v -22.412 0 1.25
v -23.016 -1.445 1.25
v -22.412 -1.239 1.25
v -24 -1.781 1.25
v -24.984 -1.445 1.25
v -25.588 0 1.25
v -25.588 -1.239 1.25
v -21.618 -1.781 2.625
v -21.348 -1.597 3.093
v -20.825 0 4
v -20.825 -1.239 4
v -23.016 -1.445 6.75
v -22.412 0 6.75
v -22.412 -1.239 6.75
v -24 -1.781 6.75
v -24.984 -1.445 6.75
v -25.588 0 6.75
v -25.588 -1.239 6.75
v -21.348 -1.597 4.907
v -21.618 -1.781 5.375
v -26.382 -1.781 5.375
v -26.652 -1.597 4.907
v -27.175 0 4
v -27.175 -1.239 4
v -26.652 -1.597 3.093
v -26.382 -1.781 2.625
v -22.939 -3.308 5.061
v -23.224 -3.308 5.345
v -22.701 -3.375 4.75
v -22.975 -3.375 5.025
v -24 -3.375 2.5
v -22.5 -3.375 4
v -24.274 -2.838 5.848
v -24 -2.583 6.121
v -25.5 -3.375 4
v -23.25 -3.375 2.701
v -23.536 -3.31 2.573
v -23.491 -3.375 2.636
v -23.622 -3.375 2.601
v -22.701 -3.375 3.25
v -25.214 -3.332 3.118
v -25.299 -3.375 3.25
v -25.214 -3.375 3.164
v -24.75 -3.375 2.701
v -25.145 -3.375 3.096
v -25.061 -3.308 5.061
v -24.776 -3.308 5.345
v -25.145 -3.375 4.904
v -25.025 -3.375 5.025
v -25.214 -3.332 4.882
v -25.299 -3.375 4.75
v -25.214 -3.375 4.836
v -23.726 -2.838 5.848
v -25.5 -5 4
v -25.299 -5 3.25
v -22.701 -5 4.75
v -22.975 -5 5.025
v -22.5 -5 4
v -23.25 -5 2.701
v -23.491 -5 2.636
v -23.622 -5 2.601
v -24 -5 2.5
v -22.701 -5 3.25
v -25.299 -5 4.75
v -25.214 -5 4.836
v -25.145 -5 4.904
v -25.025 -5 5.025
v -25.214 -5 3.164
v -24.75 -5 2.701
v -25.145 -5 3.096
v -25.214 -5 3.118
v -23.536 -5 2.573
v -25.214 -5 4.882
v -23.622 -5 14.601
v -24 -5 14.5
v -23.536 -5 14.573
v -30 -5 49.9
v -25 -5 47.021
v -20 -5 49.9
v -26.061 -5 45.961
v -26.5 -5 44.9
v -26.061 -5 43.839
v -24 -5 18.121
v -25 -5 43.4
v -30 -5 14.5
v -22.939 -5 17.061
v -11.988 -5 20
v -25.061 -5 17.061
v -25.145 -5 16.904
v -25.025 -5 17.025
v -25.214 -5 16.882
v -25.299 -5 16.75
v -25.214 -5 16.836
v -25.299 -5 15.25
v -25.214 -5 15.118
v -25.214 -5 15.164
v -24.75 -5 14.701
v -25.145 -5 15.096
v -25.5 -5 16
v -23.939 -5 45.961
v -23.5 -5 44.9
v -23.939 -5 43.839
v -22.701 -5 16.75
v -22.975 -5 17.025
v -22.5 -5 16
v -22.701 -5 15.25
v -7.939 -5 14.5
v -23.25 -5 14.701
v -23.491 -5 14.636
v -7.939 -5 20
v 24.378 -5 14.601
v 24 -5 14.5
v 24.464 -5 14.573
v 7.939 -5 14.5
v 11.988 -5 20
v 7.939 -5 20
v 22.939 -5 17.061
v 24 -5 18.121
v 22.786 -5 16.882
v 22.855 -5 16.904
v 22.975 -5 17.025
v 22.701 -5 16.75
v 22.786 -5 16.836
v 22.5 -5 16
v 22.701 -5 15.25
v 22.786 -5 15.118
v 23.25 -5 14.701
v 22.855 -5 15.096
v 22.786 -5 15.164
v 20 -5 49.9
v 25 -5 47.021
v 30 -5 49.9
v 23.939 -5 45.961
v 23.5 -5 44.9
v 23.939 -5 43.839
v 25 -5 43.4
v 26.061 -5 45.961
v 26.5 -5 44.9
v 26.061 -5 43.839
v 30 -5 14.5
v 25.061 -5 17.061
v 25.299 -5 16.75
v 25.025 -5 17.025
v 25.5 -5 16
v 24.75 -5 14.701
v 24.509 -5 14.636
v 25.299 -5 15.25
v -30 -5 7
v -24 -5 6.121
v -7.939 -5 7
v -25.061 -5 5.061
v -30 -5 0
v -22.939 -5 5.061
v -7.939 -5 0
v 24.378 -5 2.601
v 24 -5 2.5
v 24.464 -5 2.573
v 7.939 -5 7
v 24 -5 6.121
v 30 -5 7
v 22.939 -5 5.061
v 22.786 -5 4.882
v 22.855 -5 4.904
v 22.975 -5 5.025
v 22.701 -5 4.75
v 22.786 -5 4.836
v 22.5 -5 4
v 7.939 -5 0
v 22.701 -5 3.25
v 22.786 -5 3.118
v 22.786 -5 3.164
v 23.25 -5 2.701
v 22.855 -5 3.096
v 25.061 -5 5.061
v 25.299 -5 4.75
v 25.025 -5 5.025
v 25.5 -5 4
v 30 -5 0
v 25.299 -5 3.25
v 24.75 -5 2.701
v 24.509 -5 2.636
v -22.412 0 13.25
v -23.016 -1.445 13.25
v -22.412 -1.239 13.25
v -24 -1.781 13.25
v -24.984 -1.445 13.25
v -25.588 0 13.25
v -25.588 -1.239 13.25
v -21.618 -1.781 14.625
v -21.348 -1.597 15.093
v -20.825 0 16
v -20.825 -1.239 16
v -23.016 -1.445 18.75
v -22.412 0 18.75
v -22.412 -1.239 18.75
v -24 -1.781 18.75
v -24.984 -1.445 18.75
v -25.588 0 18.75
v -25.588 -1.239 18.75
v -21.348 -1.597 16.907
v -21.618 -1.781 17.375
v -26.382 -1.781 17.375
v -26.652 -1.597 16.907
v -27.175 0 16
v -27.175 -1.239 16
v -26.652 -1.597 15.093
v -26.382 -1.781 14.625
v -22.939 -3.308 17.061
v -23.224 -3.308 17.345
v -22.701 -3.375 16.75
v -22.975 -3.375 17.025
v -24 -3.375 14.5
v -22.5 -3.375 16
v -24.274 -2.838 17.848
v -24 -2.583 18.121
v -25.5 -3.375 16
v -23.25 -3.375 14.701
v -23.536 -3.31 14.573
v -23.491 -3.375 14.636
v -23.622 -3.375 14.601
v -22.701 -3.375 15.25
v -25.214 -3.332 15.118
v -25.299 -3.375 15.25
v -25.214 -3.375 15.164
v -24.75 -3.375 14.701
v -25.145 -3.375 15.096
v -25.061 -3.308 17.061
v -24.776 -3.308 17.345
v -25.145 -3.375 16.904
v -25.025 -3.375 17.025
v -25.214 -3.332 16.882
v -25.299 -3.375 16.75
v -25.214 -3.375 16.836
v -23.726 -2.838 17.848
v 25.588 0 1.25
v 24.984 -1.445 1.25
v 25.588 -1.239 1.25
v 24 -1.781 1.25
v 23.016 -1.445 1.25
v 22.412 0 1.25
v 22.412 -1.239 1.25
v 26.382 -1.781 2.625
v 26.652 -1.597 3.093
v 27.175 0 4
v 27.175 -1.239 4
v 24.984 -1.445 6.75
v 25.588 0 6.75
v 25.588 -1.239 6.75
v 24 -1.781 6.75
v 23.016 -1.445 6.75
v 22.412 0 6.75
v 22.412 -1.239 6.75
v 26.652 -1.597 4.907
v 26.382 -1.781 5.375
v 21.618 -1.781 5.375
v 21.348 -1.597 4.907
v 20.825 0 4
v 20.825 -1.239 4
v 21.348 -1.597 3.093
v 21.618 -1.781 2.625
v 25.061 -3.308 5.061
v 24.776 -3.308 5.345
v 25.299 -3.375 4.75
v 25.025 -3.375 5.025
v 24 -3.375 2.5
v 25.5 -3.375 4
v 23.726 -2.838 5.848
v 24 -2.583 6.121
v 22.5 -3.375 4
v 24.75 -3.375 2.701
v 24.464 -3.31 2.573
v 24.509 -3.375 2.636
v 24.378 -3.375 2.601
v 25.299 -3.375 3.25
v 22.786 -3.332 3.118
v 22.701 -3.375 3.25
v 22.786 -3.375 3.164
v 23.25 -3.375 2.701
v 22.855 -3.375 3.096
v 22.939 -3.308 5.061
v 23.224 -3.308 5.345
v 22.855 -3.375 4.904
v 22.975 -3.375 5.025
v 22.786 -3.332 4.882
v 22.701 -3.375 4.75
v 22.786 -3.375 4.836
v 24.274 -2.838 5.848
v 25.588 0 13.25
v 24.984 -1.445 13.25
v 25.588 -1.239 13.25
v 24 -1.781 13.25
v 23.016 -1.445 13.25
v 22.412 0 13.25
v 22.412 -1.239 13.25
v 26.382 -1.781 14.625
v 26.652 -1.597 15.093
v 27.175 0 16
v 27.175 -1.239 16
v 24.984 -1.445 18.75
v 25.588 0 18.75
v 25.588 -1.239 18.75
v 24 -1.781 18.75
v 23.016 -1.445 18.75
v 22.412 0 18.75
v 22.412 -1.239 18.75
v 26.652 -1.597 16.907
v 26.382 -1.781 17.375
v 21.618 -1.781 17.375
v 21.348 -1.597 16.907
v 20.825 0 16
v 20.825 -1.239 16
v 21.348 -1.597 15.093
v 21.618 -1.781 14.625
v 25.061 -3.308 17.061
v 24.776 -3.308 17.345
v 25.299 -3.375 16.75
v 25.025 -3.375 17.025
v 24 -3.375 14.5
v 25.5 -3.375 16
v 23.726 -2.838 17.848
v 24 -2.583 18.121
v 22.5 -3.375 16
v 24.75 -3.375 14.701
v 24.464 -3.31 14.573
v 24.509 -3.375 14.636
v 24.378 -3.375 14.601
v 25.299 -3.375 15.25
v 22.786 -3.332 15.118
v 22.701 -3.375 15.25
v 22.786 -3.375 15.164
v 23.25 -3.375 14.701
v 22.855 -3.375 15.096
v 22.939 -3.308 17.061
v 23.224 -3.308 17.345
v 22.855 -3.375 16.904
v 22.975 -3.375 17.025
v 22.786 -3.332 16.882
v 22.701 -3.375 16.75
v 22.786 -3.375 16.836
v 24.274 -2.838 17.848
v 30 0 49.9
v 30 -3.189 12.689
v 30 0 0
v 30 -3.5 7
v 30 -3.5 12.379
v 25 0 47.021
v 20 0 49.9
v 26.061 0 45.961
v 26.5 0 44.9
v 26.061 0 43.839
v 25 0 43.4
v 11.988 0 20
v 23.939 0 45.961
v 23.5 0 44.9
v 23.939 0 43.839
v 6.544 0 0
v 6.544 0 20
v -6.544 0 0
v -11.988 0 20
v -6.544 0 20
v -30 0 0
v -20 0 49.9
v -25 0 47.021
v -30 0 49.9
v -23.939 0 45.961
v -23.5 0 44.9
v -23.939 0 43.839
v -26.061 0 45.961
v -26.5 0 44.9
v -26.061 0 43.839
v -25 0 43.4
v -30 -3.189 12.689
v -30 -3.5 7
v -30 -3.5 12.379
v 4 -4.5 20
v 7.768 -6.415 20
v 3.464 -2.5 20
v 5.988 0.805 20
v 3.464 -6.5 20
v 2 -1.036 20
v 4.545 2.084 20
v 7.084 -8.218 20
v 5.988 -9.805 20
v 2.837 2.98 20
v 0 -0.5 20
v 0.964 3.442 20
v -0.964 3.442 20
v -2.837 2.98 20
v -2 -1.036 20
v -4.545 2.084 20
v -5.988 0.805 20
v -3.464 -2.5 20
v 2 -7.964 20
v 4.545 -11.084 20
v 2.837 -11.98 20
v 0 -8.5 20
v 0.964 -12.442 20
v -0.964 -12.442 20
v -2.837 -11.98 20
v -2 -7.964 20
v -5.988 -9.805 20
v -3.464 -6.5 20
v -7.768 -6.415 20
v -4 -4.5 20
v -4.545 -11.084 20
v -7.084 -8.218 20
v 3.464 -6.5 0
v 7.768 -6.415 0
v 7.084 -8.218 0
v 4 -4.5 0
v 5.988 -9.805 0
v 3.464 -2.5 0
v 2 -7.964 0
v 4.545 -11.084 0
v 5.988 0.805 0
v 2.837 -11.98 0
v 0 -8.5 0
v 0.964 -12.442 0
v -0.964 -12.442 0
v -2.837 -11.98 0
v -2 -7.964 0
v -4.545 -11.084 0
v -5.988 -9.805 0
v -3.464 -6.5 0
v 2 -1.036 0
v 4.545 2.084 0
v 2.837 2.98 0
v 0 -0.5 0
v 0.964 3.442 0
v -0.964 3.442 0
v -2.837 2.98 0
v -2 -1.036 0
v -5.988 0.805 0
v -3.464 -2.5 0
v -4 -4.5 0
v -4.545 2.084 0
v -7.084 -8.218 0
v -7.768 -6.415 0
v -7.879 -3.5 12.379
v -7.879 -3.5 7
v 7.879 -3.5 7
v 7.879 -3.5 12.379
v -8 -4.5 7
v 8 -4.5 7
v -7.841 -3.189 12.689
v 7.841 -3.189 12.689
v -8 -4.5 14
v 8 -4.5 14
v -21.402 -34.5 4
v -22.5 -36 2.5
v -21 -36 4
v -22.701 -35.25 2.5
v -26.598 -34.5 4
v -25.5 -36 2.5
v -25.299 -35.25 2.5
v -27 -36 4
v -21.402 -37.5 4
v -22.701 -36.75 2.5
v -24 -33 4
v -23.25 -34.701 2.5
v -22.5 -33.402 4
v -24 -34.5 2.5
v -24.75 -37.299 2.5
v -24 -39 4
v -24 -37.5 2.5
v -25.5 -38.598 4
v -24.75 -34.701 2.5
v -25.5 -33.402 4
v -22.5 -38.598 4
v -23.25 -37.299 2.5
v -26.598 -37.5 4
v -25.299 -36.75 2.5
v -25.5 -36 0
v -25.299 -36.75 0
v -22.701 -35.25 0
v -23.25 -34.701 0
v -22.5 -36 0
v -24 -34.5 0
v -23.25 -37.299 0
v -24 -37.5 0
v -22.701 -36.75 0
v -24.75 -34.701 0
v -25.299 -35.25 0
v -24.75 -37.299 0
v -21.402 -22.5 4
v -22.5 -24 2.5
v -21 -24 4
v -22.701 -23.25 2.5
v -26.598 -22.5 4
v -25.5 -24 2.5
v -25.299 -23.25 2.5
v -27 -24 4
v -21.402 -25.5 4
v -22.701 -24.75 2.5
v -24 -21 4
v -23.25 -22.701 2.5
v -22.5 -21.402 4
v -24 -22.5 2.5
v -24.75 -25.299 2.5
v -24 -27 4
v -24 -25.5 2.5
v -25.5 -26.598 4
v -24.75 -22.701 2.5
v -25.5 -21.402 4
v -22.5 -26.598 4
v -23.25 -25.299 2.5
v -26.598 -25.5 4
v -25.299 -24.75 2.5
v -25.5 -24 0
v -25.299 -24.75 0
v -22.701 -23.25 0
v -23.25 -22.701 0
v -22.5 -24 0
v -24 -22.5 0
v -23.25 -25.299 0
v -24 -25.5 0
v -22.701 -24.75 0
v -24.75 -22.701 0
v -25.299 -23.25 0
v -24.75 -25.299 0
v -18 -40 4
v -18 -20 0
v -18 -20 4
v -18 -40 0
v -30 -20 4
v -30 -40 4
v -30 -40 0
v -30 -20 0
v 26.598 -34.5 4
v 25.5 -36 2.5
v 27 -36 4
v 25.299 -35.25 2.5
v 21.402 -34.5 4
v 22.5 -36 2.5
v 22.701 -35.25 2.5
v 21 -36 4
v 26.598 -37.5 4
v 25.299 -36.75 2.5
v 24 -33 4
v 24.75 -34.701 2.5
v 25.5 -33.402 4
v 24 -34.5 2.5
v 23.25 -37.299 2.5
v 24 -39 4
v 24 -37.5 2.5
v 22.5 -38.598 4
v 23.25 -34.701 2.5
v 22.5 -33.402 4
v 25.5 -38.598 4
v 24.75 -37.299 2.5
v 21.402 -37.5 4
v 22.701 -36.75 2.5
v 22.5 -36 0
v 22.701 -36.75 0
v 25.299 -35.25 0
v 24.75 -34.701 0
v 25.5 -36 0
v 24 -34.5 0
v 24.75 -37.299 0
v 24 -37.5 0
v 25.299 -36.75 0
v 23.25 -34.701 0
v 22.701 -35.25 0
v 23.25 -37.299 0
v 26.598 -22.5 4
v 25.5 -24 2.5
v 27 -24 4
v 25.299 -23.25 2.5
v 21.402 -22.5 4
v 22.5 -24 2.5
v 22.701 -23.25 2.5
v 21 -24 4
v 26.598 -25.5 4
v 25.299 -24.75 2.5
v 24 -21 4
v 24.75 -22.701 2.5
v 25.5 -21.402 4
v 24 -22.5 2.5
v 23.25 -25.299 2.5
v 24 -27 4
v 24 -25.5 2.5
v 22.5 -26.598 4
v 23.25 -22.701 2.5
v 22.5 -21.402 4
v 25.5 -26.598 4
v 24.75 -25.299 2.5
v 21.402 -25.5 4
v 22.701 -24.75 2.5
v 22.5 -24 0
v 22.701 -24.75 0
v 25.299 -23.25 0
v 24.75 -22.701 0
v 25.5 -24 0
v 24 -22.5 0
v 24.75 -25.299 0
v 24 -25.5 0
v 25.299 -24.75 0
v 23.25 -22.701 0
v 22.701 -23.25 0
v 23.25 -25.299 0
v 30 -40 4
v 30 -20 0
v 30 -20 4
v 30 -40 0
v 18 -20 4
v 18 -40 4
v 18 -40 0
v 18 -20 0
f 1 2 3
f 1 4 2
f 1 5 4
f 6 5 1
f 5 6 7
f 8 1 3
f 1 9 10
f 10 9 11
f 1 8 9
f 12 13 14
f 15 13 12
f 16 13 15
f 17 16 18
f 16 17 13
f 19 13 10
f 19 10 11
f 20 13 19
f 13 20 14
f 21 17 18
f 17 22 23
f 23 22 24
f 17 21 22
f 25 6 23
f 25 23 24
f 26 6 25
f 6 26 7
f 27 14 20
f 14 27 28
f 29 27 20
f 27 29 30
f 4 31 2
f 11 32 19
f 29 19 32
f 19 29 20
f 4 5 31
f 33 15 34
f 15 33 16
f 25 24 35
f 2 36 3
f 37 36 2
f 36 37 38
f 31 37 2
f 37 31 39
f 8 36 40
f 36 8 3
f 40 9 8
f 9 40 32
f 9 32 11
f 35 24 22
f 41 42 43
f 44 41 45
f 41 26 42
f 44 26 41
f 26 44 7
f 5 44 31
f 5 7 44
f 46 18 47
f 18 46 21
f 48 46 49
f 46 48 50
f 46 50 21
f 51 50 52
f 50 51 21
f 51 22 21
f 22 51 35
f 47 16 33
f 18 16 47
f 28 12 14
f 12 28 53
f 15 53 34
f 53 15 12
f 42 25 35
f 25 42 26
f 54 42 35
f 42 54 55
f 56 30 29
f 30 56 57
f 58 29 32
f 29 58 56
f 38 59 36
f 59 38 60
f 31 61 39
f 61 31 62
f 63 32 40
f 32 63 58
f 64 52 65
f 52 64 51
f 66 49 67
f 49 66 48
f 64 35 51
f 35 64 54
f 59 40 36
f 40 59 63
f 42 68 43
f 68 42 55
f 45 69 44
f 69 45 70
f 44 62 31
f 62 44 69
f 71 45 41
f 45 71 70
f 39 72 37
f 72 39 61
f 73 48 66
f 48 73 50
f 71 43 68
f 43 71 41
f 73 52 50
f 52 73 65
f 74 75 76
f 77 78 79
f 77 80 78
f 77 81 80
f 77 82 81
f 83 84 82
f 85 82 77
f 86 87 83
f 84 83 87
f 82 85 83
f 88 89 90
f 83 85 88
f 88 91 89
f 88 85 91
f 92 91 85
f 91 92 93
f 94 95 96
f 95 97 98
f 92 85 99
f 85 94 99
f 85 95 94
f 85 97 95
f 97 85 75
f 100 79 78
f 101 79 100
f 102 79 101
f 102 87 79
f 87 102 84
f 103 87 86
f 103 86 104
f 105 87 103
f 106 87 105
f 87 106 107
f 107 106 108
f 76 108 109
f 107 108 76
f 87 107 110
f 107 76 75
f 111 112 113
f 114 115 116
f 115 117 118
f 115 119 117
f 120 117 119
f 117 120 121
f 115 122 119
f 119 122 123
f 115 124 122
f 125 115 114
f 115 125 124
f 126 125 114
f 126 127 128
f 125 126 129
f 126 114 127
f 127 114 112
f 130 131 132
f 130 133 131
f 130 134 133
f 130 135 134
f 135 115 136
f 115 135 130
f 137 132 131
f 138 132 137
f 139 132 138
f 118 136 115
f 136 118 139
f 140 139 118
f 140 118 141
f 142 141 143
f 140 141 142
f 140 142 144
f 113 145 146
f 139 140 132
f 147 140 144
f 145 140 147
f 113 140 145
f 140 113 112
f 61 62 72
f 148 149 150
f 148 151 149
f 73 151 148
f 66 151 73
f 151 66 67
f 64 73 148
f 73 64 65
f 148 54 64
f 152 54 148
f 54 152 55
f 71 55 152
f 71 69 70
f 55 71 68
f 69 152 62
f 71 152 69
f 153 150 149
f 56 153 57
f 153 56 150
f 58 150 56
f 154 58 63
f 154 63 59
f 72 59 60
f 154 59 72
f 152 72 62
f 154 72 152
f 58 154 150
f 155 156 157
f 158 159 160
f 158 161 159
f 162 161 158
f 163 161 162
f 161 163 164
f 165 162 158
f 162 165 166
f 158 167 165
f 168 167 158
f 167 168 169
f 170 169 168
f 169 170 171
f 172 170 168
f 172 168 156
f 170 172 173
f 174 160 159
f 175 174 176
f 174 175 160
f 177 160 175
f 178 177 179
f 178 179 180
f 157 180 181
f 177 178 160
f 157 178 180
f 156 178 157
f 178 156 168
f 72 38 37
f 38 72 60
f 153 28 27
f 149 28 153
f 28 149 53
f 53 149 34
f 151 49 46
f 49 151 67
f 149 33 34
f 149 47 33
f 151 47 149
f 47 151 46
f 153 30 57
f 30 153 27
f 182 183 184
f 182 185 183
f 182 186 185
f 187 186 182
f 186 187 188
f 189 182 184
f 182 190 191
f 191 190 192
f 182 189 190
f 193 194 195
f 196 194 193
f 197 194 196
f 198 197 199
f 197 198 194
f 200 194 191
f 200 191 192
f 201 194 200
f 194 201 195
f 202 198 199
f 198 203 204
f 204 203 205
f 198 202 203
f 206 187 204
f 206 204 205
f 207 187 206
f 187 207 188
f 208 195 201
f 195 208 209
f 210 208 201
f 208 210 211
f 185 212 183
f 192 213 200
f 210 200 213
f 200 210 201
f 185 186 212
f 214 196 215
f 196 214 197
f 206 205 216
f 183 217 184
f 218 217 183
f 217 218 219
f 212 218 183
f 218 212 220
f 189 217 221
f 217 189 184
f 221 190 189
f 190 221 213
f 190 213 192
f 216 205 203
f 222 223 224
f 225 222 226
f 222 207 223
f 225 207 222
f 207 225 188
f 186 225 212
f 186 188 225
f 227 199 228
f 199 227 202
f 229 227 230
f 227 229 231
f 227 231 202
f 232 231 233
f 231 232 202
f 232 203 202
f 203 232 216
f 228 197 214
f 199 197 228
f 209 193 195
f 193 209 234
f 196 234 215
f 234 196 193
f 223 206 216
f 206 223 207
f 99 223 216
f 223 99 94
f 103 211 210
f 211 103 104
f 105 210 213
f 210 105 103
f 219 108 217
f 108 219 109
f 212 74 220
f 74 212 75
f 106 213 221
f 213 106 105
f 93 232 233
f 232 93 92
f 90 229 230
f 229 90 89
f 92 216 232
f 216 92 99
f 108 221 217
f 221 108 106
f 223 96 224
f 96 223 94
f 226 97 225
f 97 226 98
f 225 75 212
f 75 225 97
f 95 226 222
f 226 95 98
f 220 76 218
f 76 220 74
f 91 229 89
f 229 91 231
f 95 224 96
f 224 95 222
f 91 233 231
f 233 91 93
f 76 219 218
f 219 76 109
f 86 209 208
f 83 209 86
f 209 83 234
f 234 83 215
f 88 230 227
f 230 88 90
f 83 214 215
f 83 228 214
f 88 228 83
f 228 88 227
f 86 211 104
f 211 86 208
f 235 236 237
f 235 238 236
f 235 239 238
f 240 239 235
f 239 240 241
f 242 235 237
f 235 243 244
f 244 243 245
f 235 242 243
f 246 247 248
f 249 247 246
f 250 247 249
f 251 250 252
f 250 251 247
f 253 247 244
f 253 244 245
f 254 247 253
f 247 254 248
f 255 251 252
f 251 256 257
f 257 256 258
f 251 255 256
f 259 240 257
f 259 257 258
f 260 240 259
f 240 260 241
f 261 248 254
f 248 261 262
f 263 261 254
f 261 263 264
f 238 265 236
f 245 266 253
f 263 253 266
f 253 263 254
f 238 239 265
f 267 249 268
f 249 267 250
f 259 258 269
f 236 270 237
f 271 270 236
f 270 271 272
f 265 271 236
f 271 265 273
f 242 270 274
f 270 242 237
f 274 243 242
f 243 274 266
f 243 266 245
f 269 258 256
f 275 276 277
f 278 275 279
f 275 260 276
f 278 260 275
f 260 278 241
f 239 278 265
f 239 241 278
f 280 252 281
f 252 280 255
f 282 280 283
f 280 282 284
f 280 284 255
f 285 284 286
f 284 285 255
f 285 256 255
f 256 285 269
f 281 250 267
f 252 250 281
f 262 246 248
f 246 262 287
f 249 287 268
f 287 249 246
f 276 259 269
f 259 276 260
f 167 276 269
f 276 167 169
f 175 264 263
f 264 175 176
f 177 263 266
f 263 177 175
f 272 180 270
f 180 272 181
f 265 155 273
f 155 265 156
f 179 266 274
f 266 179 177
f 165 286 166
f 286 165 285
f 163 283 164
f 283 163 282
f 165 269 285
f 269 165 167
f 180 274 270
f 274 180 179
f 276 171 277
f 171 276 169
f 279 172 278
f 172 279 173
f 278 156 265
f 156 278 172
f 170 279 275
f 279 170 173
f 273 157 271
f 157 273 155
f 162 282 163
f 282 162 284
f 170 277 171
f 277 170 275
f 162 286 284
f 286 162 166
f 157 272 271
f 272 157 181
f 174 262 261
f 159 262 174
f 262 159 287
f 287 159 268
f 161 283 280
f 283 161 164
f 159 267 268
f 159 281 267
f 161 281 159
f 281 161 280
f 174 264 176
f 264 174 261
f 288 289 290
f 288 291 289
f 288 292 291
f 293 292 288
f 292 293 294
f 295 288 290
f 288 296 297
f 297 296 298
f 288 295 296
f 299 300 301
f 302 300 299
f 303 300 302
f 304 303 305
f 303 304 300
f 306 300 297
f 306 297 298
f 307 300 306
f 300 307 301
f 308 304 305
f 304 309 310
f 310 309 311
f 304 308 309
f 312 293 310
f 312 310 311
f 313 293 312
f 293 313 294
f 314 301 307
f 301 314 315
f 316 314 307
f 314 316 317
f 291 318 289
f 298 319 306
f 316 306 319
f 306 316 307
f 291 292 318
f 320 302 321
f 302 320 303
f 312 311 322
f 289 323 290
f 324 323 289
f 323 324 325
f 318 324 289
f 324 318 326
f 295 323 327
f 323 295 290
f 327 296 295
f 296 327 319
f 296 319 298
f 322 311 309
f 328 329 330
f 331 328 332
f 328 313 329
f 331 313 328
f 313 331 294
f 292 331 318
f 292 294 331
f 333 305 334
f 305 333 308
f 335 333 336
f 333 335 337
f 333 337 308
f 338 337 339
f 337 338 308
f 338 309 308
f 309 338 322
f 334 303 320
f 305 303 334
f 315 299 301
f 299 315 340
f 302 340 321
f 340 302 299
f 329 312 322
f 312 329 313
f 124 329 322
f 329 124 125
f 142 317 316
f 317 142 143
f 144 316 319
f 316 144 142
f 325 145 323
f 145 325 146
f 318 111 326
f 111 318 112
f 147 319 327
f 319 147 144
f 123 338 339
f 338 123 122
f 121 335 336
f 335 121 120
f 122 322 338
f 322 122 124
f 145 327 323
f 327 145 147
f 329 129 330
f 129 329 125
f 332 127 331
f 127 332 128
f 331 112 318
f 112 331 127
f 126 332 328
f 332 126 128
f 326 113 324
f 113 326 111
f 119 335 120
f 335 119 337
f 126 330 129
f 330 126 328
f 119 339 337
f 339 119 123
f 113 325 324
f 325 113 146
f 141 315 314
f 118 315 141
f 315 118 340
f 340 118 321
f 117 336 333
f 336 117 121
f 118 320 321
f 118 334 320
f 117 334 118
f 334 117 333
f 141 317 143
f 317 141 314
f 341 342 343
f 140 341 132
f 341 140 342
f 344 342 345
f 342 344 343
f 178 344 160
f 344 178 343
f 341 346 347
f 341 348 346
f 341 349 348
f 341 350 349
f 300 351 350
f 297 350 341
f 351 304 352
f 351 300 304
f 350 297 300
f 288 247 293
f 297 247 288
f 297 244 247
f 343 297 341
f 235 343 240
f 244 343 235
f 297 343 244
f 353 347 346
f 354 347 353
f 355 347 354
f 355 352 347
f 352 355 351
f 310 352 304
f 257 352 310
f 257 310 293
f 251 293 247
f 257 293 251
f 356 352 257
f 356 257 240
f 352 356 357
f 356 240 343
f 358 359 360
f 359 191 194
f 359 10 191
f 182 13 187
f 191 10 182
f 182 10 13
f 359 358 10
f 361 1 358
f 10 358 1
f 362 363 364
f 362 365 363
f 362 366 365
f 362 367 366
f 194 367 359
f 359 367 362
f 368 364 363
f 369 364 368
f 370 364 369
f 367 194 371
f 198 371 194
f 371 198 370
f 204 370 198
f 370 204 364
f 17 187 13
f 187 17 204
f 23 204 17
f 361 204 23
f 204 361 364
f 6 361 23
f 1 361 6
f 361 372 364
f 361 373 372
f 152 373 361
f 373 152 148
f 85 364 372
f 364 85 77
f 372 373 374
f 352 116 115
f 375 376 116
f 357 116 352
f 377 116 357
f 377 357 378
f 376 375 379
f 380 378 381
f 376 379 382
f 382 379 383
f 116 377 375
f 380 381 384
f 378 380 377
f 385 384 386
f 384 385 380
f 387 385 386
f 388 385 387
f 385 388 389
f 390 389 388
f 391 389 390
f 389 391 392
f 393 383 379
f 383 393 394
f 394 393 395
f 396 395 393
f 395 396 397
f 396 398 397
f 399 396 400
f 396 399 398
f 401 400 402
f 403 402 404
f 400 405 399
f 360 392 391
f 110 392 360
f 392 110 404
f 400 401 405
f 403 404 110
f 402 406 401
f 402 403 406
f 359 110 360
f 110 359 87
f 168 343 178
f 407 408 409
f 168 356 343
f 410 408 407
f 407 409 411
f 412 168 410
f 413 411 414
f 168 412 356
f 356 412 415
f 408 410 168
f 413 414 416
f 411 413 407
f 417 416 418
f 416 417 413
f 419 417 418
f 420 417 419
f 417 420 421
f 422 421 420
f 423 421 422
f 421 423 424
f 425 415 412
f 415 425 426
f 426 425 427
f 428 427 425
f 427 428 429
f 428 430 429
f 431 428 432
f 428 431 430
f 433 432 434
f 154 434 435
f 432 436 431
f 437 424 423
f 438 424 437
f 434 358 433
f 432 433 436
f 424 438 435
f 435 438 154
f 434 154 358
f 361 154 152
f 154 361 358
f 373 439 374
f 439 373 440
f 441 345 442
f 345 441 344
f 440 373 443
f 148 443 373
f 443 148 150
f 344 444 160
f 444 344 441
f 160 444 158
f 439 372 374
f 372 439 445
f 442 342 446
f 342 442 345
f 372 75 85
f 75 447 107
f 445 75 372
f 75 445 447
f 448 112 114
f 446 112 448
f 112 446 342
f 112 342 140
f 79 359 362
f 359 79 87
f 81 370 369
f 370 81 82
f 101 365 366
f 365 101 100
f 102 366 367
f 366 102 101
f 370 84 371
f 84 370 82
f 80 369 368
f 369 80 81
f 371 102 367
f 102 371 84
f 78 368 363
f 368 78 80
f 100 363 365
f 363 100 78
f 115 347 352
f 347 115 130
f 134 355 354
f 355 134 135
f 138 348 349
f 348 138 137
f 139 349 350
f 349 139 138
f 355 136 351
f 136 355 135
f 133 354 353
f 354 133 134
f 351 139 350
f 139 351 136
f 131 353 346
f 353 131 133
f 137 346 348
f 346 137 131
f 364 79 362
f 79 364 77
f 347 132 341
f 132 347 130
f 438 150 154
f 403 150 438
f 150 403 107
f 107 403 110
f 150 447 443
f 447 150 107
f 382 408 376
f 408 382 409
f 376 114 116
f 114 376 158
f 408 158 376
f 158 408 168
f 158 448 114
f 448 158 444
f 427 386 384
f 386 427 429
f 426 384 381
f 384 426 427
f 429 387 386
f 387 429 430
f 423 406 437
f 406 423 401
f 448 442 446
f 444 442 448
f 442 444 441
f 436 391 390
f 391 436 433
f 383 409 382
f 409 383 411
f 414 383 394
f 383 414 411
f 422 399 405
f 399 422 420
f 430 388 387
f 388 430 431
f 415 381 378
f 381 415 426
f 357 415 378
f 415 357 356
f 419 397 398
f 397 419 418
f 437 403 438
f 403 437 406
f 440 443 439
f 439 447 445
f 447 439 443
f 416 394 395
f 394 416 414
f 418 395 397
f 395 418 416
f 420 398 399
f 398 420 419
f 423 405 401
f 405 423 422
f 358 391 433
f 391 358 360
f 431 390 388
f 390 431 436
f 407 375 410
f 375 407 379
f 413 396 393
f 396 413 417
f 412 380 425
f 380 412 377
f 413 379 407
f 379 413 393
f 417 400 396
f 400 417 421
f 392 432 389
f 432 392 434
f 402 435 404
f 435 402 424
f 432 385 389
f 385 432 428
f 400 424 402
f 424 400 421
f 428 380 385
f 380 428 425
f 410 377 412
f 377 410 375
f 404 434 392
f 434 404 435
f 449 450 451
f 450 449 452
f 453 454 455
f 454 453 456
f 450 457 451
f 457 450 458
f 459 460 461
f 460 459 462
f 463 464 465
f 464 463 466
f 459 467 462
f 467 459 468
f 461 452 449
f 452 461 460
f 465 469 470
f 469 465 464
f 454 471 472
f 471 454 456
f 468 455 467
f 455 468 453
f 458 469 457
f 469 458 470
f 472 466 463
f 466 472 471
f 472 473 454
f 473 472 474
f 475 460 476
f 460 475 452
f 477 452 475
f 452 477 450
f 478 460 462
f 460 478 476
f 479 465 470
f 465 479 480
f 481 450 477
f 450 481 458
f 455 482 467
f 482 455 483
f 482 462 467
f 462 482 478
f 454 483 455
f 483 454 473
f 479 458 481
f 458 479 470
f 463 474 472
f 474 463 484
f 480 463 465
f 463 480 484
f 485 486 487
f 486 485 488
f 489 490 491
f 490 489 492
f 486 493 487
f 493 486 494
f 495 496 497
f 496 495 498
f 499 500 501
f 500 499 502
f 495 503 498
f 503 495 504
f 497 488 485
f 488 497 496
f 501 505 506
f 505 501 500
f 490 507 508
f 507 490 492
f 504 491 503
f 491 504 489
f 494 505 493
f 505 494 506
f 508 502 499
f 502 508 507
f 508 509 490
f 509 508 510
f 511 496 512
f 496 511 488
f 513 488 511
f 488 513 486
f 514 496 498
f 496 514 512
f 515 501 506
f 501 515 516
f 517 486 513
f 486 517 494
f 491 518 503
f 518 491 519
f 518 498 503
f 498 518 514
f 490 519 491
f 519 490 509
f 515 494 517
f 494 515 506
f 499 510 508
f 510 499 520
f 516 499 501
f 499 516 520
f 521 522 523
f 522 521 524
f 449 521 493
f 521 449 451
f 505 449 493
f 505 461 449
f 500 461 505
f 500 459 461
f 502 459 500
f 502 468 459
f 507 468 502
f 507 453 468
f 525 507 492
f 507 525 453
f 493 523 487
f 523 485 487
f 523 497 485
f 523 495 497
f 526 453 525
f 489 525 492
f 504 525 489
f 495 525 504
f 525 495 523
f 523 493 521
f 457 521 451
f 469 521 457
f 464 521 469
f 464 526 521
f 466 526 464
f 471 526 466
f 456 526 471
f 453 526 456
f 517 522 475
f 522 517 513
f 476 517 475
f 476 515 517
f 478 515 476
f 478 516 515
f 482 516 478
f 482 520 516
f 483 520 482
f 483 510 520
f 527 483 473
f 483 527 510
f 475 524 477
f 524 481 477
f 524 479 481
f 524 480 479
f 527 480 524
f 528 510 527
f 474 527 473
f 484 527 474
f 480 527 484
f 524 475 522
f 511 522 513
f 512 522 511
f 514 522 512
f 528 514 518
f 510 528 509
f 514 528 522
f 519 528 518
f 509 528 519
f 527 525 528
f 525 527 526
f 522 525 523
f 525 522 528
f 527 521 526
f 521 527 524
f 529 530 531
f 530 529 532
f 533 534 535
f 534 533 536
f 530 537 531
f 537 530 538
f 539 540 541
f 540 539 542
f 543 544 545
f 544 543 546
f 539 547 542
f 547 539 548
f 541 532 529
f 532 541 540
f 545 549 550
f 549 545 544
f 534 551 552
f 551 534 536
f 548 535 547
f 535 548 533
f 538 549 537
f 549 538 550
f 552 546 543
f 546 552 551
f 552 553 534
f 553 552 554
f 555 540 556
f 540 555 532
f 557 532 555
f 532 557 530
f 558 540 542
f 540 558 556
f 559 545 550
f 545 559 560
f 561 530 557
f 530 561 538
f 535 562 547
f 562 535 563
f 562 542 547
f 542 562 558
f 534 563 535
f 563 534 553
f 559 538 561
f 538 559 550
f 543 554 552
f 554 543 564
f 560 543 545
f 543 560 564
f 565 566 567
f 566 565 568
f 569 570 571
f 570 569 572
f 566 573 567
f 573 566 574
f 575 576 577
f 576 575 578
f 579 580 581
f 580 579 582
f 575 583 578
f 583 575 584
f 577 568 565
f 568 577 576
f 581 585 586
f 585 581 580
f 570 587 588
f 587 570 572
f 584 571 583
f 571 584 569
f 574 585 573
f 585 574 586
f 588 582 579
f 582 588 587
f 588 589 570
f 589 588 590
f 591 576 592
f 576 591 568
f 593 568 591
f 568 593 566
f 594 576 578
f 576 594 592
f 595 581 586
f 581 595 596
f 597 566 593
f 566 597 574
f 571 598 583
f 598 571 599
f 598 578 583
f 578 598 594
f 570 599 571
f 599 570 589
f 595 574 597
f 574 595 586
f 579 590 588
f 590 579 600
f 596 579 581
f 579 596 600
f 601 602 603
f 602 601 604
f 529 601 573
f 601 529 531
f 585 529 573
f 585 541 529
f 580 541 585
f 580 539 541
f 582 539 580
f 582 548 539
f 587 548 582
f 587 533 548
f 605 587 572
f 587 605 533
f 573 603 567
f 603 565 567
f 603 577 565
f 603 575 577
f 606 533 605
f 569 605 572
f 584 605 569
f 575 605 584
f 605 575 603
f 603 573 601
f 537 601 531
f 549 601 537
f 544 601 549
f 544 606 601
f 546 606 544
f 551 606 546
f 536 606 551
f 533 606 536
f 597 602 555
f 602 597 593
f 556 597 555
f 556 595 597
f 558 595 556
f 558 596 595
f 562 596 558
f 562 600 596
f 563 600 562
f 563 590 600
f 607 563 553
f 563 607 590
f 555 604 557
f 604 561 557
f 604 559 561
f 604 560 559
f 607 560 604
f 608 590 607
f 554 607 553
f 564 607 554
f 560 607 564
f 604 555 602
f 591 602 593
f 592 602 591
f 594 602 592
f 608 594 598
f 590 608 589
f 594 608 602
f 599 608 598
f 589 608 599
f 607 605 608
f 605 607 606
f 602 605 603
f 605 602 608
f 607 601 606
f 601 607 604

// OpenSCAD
// file: ../ShapeLibrary/CounterSink.scad
// Vertical countersink with top of countersink centred on origin 
//
// od = overall diameter (for screw head)
// oh = overall height (screw + head +recesss)
// sd = screw diameter
// sh = screw height (to top of countersink)
module countersinkZ(od, oh, sd, sh)
{
    union()
    {
        intersection()
	    {
            translate([0,0,-sh]) cylinder(r=od/2, h=oh, $fn=12);
            translate([0,0,-od/2]) cylinder(r1=0, r2=oh+od/2, h=oh+od/2, $fn=12);
        }
    translate([0,0,-sh]) cylinder(r=sd/2, h=sh, $fn=12);
    }
}

// Countersink with screw directed along negative X-axis
module countersinkX(od, oh, sd, sh)
{
    rotate([0,90,0]) countersinkZ(od, oh, sd, sh);
}

// Countersink with screw directed along negative Y-axis
module countersinkY(od, oh, sd, sh)
{
    rotate([90,0,0]) countersinkZ(od, oh, sd, sh);
}


// Examples
countersinkZ(8, 20, 4, 10);

translate([0,15,0]) countersinkX(8, 20, 4, 10);

translate([15,0,0]) countersinkY(8, 20, 4, 10);
// file: DriveBeltConnector.scad
// Drive belt connector

use <../ShapeLibrary/NutRecessCS.scad>
use <../ShapeLibrary/CounterSink.scad>

// Tooth profile, tooth centred on origin
//
// p = pitch (tooth is half thios)
// w = width
// h = height of tooth (extra is added at base)
// a = angle of tooth face
//
module Tooth(p, w, h, a)
{
    d = 0.1;
    difference()
    {
        translate([0,0,d/2])
            cube(size=[p, w, h+d], center=true);
        translate([p/4,0,0])
            rotate([0,a,0])
                translate([p/2,0,0])
                    cube(size=[p, w*2, h*4], center=true);
        translate([-p/4,0,0])
            rotate([0,-a,0])
                translate([-p/2,0,0])
                    cube(size=[p, w*2, h*4], center=true);
    }
}

//Tooth(5, 6, 1.2, 20);

// Tooth profile section of length l and width w, 
// Aligned with and centred on X axis, with teeth downwards
// touching X-Y plane
// can be subtracted from object to leave tooth profile.
//
// Per http://www.contitech.de/pages/produkte/antriebsriemen/antrieb-industrie/download/TD_Synchroflex_en.pdf
//   Tooth pitch = 5
//   Tooth andgle between faces = 40%
//   Tooth height = 1.2
//
module ToothProfileX(l, w)
{
    tp = 5;
    th = 1.2;
    ta = 20;
    translate([-l/2-tp/4, -w/2, th]) cube(size=[l+tp/2, w, 10]);
    for ( to = [ -l/2 : tp : l/2 ] )
    {
        translate([to,0,th/2]) Tooth(tp,w,th,ta);
    }
}

//ToothProfileX(80, 6);

// Belt connector base, aLigned with X axis
//
// l   = overall length
// w   = overall width
// d   = overall thickness (depth)
// bw  = belt width
// bd  = belt depth (to extent of teeth)
// hpx = hole pitch X
// hpy = hole pitch Y
// hd  = hole diameter (countersink width twice this)
// naf = nut across faces size
// nt  = nut thickness
//
module BeltConnectorBase(l, w, d,  bw, bd,  hpx, hpy, hd,  naf, nt)
{
    difference()
    {
        translate([-l/2, -w/2, 0]) cube(size=[l, w, d]);
        # translate([0,0,d-bd]) ToothProfileX(l, bw);
        for ( xo = [-hpx/2, hpx/2])
        {
            for ( yo = [-hpy/2, hpy/2] )
            {
                translate([xo, yo, nt]) 
                    mirror([0,0,1])
                        nutrecessZcs(naf, d*3, 3, d*2);
            }
        }
    }
}

// Belt connector clamping piece
module BeltConnectorClamp(l, w, d, hpy, hd, cd)
{
    difference()
    {
        translate([-l/2, -w/2, 0]) cube(size=[l, w, d]);
        for ( yo = [-hpy/2, hpy/2] )
        {
            translate([0, yo, d]) 
                countersinkZ(6, d*3, 3, d*2);
        }
    }
}

BeltConnectorBase(60, 20, 4,   6, 1.5,   48, 12, 3,   5.5, 2);

for ( xo = [ -24, 24 ] )
{
    translate([xo, -30, 0]) 
        BeltConnectorClamp(12, 20, 4,  12, 3, 6);
} 
// file: ../ShapeLibrary/NutRecessCS.scad
// Vertical nut recess with base of nut centred on origin 
//
// Includes countersing at base of nut for downward-facing print
//
// af = nut size accross faces
// oh = overall height (screw + head + recesss)
// sd = screw diameter
// sh = screw height (to shoulder of nut recess)
//
module nutrecessZcs(af, oh, sd, sh)
{
  sin60 = sin(60);
  union()
  {
    // % translate([0,0,oh-sh]) cylinder(r=af/sin60/2, h=5, $fn=12);
    // Square shoulder...
    //cylinder(r=af/sin60/2, h=oh-sh, $fn=6);
    // Angle shoulder at 45deg for printing...
    intersection()
    {
        translate([0,0,-sh]) cylinder(r=af/sin60/2, h=oh, $fn=6);
        translate([0,0,-af/4])
          cylinder(r1=sd/2, r2=sd/2+(oh-sh), h=oh-sh+af/4, $fn=12);
    }
    translate([0,0,-sh]) cylinder(r=sd/2, h=oh, $fn=12);
  }
}

// Nut recess with screw directed along negative X-axis
module nutrecessXcs(od, oh, sd, sh)
{
    rotate([0,90,0]) nutrecessZcs(od, oh, sd, sh);
}

// Nut recess with screw directed along negative Y-axis
module nutrecessYcs(od, oh, sd, sh)
{
    rotate([90,0,0]) nutrecessZcs(od, oh, sd, sh);
}


// Examples
nutrecessZcs(7, 20, 4, 15);

translate([0,15,0]) nutrecessXcs(7, 20, 4, 10);

translate([15,0,0]) nutrecessYcs(7, 20, 4, 10);
// file: ../ShapeLibrary/Teardrop.scad
// Base teardrop shape, one end centred on origin, extending for given distance
// (positive or negative) along the Z axis.
//
// l = length of shape (negative extends in -z direction)
// d = diameter of hole
// q = quadrant orientation of point: 
//       0 => +x
//       1 => +y
//       2 => -x
//       3 => -y
//
module TeardropZ(l,d,q)
{
    zl = abs(l);
    zo = min(0,l);
    translate([0,0,zo])
    {
        cylinder(r=d/2,h=zl);
        rotate([0,0,-45+q*90]) cube([d/2,d/2,zl]);
    }
}

// Teardrop shape aligned along X-axis.
//
// Use for making horizontal holes in objects.
//
// l = length of shape (negative extends in -x direction)
// d = diameter of hole
// q = quadrant orientation of point: 
//       0 => +z
//       1 => +y
//       2 => -z
//       3 => -y
module TeardropX(l,d,q)
{
    rotate([0,-90,0]) TeardropZ(-l,d,q);
}

// Teardrop shape aligned along Y-axis.
//
// Use for making horizontal holes in objects.
//
// l = length of shape (negative extends in -y direction)
// d = diameter of hole
// q = quadrant orientation of point: 
//       0 => +z
//       1 => +x
//       2 => -z
//       3 => -x
module TeardropY(l,d,q)
{
    rotate([90,0,0]) TeardropZ(-l,d,-q+1);
}

// Teardrop aligned along Y axis, between given x, y, and z coordinates
// [x, y1, z] to [x, y2, z]
// Teardrop point to +Z
module teardropY2(x, y1, y2, z, r)
{
  h = y2-y1;
  translate([x,y2,z])
  {
    rotate([90,0,0])
    {
      cylinder(r=r,h=h, $fn=8);
      rotate([0,0,45])
        cube(size=[r, r, h]) ;
    }
  }
}

// Examples
TeardropZ(30,10,1,$fn=12);
TeardropX(30,10,0);
TeardropY(30,10,0);
// file: ../ShapeLibrary/Chamfer.scad
// External chamfer along X-axis from given point which lies
// on the edge to be chamfered off, marked with "+":
//
//   +-.---
//   |/
//   .
//   |
//
// Point p is at one end, and the other end is at p+[l,0,0],
// (so the sign of l controls the direction to the other end).
//
// w is the size of the chamfer (distance from "+" to "." above).
//
// q=0 -> chamfer to +y,+z
// q=1 -> chamfer to -y,+z
// q=2 -> chamfer to -y,-z
// q=3 -> chamfer to +y,-z
// (Non-integral values of Q can tweak the chamfer angle,
// but the value of w is not preserved.)
//
// The chamfer is defined as a shape that is to be subtracted from
// the original to which the chamfer is applied.
//
module chamferX(p, l, w, q, d)
{
  xl = abs(l);
  xo = min(l,0);
  translate(p)
    rotate([45+q*90,0,0])
      translate([xo-d,0,-w])
        cube(size=[xl+2*d,w/sqrt(2),w*2]);
}

// External chamfer aligned with Y-axis
//
// q=0 -> chamfer to +x,+z
// q=1 -> chamfer to -x,+z
// q=2 -> chamfer to -x,-z
// q=3 -> chamfer to +x,-z
//
module chamferY(p, l, w, q, d)
{
  yl = abs(l);
  yo = min(l,0);
  translate(p)
    rotate([0,-45-q*90,0])
      translate([0,yo-d,-w])
        cube(size=[w/sqrt(2),yl+2*d,w*2]);
}

// External chamfer aligned with Z-axis
//
// q=0 -> chamfer to +x,+y
// q=1 -> chamfer to -x,+y
// q=2 -> chamfer to -y,-y
// q=3 -> chamfer to +y,-y
//
module chamferZ(p, l, w, q, d)
{
  zl = abs(l);
  zo = min(l,0);
  translate(p)
    rotate([0,0,45+q*90])
      translate([0,-w,zo-d])
        cube(size=[w/sqrt(2),w*2,zl+2*d]);
}

// X-axis internal chamfer located on/ending at a given edge;
// marked "+" or "*" here:
//
//   .-*---
//   |/
//   +
//   |
//
// Point p is at one end, and the other end is at p+[l,0,0],
// (so the sign of l controls the direction to the other end).
//
// w is the size of the chamfer (distance from "+" to "." above).
//
// q=0 -> chamfer to +z
// q=1 -> chamfer to -y
// q=2 -> chamfer to -z
// q=3 -> chamfer to +y
//
// Unlike the external chamfer, this defined shape is added to a shape to
// make the chamfer
//
module chamferXint(p, l, w, q, d)
{
  xl = abs(l);
  xo = min(l,0);
  translate(p)
    rotate([+45+q*90,0,0])
      translate([xo-d,0,0])
        cube(size=[xl+2*d,w*sqrt(2),w*sqrt(2)]);
}

// Y-axis internal chamfer located on/ending at a given edge
//
// q=0 -> chamfer to +z
// q=1 -> chamfer to -x
// q=2 -> chamfer to -z
// q=3 -> chamfer to +x
module chamferYint(p, l, w, q, d)
{
  yl = abs(l);
  yo = min(l,0);
  translate(p)
    rotate([0,-45-q*90,0])
      translate([0,yo-d,0])
        cube(size=[w*sqrt(2),yl+2*d,w*sqrt(2)]);
}


// Z-axis internal chamfer located on/ending at a given edge
//
// q=0 -> chamfer to +x
// q=1 -> chamfer to -y
// q=2 -> chamfer to -x
// q=3 -> chamfer to +y
module chamferZint(p, l, w, q, d)
{
  zl = abs(l);
  zo = min(l,0);
  translate(p)
    rotate([0,0,-45-q*90])
      translate([0,0,zo-d])
        cube(size=[w*sqrt(2),w*sqrt(2),zl+2*d]);
}

// Examples

union()
{
    difference()
    {
        cube([25,25,25]);
        translate([10,10,10]) cube([25,25,25]);
        chamferX([0,0,0],20,5,0,0.1);
        chamferY([0,0,0],20,5,0,0.1);
        chamferZ([0,0,0],20,5,0,0.1);
    }
   chamferXint([10,15,10],12,5,1,0.1);	// q=1 : -y
   chamferYint([15,10,10],12,5,1,0.1);  // q=1 : -x
   //chamferZint([15,10,10],25,5,2,0.1);  // q=2 : -x
   chamferZint([10,15,10],12,5,1,0.1);  // q=1 : -y
}
// main file
// Open-Y carriage Drive belt connector

use <../ShapeLibrary/Chamfer.scad>
use <../ShapeLibrary/Teardrop.scad>
use <../ShapeLibrary/NutRecessCS.scad>
//use <../ShapeLibrary/CounterSink.scad>
use <DriveBeltConnector.scad>

// Belt connector base, aLigned with X axis
//
// l   = overall length
// w   = overall width
// d   = overall thickness (depth)
// bw  = belt width
// bd  = belt depth (to extent of teeth)
// hpx = hole pitch X
// hpy = hole pitch Y
// hd  = hole diameter (countersink width twice this)
// naf = nut across faces size
// nt  = nut thickness
//
module OpenYBeltConnectorPlate(l, w, d,  bw, bd,  hpx, hpy, hd,  naf, nt)
{
    delta = 0.1;
    difference()
    {
        translate([-l/2, -w/2, 0]) cube(size=[l, w, d]);
        translate([-l/2-delta, -bw/2, d-bd]) cube(size=[l+delta*2, bw, 10]);
        chamferX([-l/2,bw/2,d], l, bd, 3, delta);
        for ( xo = [-hpx/2, hpx/2])
        {
            for ( yo = [-hpy/2, hpy/2] )
            {
                translate([xo, yo, 0]) 
                {
                    translate([0, 0, nt]) 
                        mirror([0,0,1])
                            nutrecessZcs(naf, d*3, 3, d*2);
                    TeardropZ(d, 3, 1);
                }
            }
        }
    }
}


// Extend plate with Y-flag attachment points
module OpenYFlagAttachments(l, w, t, hd)
{
    delta = 0.1;
    angle = -15;
    difference()
    {
        translate([-l/2, -w/2, 0])
            cube(size=[l, w, t]);
        for ( xo = [-1,1])
        {
            # translate([0, 0, 0])
                intersection()
                {
                    # translate([(l/2-10)*xo, w/2, 0])
                        rotate([0,0,angle*xo])
                            translate([-(xo+1)/2*l, -l*0.8, -delta])
                                cube(size=[l, l, t+delta*2]);
                    translate([l/2*xo,0,0])
                        translate([-l/2,-l/2,-delta])
                            cube(size=[l,l,t+delta*2]);
                }
            translate([xo*(l/2-5), w/2-5, -delta]) 
            {
                TeardropZ(t+delta*2, 3, 1, $fn=8);
            }
        }
        //for ( xo = [-(l/2-5), (l/2-5)])
        //{
        //    # translate([xo, w/2-5, -delta]) 
        //    {
        //        TeardropZ(t+delta*2, 3, 1, $fn=8);
        //    }
        //}
    }
}

//OpenYFlagAttachments(60, 30, 4, 3);

module OpenYBeltConnector()
{
    delta = 0.1;
	l  = 60;
    w  = 20;
    fw = 30;
    t  = 5;
    bw = 6;
    bd = 1.5;
    driveoffset = t - bd + 1;		// Height of centre of belt
    translate([0,0,w/2])
    {
        rotate([90,0,0])
        {
            difference()
            {
                union()
                {
                    OpenYBeltConnectorPlate(l, w, t,   bw, bd,   48, 12, 3,   5.5, 2);
                    translate([0,(fw+w)/2-delta,0])
                        OpenYFlagAttachments(l, fw, t, 3);
                    //translate([0,0,driveoffset])
                    //    rotate([0,45,0])
                    //        cube(size=[16, 20, 16], center=true);
                    translate([0,0,driveoffset])
                        rotate([90,0,0])
                            cylinder(r=8, h=20, center=true);
                }
            translate([0,25,driveoffset])
                rotate([90,0,0])
                    cylinder(r=4, h=40, $fn=12);
            }
        }
    }
}

OpenYBeltConnector();

for ( xo = [ -24, 24 ] )
{
    translate([xo, -30, 0]) 
        BeltConnectorClamp(12, 20, 4,  12, 3, 6);
} 
